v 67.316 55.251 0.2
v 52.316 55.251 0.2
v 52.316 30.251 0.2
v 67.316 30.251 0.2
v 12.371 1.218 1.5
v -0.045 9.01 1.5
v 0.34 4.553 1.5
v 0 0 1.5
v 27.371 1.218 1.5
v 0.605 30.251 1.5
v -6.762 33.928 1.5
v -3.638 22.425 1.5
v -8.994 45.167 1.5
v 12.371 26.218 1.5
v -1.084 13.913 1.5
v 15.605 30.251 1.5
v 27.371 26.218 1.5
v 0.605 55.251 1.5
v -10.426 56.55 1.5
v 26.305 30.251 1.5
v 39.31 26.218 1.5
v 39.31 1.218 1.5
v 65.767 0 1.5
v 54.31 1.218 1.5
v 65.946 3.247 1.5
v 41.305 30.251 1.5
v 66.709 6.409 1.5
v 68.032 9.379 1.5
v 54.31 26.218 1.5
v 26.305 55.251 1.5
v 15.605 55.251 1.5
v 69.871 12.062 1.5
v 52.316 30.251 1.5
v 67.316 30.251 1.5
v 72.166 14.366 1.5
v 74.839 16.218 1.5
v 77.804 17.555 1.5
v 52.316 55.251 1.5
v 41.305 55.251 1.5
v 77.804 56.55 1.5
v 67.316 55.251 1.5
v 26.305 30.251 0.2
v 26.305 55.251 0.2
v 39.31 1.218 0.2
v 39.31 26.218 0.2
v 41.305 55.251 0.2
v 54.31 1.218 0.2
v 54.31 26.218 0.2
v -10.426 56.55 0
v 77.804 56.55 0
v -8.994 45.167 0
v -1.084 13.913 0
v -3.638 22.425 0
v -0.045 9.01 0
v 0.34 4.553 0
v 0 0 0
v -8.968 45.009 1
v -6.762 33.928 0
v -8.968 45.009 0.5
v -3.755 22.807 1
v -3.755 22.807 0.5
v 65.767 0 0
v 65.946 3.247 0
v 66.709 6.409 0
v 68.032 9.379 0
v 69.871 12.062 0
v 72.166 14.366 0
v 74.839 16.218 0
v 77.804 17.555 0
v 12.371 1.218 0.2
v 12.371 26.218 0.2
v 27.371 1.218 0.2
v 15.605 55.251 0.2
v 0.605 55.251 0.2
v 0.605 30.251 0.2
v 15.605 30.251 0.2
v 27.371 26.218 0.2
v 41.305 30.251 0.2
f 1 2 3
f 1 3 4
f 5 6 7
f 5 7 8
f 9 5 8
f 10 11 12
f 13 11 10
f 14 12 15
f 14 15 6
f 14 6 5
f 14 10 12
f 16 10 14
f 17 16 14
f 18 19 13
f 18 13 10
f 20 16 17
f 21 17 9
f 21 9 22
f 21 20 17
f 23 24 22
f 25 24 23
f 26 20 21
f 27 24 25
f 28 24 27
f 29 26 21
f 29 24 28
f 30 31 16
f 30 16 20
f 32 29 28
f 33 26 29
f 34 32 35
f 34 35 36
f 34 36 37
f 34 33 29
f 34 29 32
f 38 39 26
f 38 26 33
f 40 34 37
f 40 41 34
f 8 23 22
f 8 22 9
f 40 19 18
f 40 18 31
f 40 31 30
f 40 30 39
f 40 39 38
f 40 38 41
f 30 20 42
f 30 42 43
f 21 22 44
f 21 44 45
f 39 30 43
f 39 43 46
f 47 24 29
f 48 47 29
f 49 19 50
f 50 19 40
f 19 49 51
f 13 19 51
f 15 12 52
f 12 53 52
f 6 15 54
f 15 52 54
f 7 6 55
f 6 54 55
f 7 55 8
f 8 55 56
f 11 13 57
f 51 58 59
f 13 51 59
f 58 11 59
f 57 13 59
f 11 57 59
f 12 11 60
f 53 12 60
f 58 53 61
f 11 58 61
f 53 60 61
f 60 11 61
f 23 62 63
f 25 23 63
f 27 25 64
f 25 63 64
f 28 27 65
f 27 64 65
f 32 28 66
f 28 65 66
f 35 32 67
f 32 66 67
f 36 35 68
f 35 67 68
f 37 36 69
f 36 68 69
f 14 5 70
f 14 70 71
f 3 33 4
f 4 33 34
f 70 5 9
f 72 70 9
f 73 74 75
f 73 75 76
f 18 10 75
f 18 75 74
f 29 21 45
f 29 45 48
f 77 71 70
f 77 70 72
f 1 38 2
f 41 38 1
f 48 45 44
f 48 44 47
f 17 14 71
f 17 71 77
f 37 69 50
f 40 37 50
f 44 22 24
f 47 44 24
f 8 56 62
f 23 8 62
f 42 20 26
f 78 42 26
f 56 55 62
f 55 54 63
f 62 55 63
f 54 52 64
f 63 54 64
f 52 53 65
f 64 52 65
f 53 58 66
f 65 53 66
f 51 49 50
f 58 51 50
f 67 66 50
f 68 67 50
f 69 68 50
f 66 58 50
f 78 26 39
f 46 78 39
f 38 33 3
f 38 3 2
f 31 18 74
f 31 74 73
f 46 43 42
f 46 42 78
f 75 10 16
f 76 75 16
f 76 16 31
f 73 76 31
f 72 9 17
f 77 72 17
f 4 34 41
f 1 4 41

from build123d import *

# Parameters (mm, degrees)
BOSS_EXTRUDE1_DEPTH = 1.5
SKETCH2_W           = 144.766923913
SKETCH2_H           = 30.83722243
CUT_EXTRUDE1_DEPTH  = 65.5
SKETCH3_W           = 15
SKETCH3_H           = 25
CUT_EXTRUDE2_DEPTH  = 1.3


with BuildPart() as part:
    # Sketch1 → Boss-Extrude1 (new body)
    with BuildSketch(Plane.XY):
        with BuildLine():
            Line((0, 0), (65.76731, 0))
            ThreePointArc((65.76731, 0), (68.890778194, 10.762295293), (77.804111714, 17.55461))
            Line((77.804111714, 17.55461), (77.804111714, 76.07506))
            Line((77.804111714, 76.07506), (-10.924558286, 76.07506))
            add(Edge.make_bspline(
                [(-10.924558286, 76.07506), (-11.335216037, 65.701051621), (-10.134883802, 47.610493724), (-4.204795631, 22.570600883), (1.324592934, 7.942603507), (0, 0)],
                knots=[0, 0, 0, 0, 0.403327981, 0.698479283, 1, 1, 1, 1], degree=3))
        make_face()
    extrude(amount=BOSS_EXTRUDE1_DEPTH)

    # Sketch2 → Cut-Extrude1 (cut)
    with BuildSketch(Plane.XY.offset(11.5)):
        with Locations((32.739385879, 71.968611215)):
            Rectangle(SKETCH2_W, SKETCH2_H)
    extrude(amount=-CUT_EXTRUDE1_DEPTH, mode=Mode.SUBTRACT)

    # Sketch3 → Cut-Extrude2 (cut)
    with BuildSketch(Plane.XY.offset(1.5)):
        with Locations((8.104747285, 42.750740974)):
            Rectangle(SKETCH3_W, SKETCH3_H)
        with Locations((33.805332754, 42.750740974)):
            Rectangle(SKETCH3_W, SKETCH3_H)
        with Locations((59.815563831, 42.750740974)):
            Rectangle(SKETCH3_W, SKETCH3_H)
        with Locations((19.871280391, 13.717582368)):
            Rectangle(SKETCH3_W, SKETCH3_H)
        with Locations((46.810448292, 13.717582368)):
            Rectangle(SKETCH3_W, SKETCH3_H)
    extrude(amount=-CUT_EXTRUDE2_DEPTH, mode=Mode.SUBTRACT)


solid = part.part
